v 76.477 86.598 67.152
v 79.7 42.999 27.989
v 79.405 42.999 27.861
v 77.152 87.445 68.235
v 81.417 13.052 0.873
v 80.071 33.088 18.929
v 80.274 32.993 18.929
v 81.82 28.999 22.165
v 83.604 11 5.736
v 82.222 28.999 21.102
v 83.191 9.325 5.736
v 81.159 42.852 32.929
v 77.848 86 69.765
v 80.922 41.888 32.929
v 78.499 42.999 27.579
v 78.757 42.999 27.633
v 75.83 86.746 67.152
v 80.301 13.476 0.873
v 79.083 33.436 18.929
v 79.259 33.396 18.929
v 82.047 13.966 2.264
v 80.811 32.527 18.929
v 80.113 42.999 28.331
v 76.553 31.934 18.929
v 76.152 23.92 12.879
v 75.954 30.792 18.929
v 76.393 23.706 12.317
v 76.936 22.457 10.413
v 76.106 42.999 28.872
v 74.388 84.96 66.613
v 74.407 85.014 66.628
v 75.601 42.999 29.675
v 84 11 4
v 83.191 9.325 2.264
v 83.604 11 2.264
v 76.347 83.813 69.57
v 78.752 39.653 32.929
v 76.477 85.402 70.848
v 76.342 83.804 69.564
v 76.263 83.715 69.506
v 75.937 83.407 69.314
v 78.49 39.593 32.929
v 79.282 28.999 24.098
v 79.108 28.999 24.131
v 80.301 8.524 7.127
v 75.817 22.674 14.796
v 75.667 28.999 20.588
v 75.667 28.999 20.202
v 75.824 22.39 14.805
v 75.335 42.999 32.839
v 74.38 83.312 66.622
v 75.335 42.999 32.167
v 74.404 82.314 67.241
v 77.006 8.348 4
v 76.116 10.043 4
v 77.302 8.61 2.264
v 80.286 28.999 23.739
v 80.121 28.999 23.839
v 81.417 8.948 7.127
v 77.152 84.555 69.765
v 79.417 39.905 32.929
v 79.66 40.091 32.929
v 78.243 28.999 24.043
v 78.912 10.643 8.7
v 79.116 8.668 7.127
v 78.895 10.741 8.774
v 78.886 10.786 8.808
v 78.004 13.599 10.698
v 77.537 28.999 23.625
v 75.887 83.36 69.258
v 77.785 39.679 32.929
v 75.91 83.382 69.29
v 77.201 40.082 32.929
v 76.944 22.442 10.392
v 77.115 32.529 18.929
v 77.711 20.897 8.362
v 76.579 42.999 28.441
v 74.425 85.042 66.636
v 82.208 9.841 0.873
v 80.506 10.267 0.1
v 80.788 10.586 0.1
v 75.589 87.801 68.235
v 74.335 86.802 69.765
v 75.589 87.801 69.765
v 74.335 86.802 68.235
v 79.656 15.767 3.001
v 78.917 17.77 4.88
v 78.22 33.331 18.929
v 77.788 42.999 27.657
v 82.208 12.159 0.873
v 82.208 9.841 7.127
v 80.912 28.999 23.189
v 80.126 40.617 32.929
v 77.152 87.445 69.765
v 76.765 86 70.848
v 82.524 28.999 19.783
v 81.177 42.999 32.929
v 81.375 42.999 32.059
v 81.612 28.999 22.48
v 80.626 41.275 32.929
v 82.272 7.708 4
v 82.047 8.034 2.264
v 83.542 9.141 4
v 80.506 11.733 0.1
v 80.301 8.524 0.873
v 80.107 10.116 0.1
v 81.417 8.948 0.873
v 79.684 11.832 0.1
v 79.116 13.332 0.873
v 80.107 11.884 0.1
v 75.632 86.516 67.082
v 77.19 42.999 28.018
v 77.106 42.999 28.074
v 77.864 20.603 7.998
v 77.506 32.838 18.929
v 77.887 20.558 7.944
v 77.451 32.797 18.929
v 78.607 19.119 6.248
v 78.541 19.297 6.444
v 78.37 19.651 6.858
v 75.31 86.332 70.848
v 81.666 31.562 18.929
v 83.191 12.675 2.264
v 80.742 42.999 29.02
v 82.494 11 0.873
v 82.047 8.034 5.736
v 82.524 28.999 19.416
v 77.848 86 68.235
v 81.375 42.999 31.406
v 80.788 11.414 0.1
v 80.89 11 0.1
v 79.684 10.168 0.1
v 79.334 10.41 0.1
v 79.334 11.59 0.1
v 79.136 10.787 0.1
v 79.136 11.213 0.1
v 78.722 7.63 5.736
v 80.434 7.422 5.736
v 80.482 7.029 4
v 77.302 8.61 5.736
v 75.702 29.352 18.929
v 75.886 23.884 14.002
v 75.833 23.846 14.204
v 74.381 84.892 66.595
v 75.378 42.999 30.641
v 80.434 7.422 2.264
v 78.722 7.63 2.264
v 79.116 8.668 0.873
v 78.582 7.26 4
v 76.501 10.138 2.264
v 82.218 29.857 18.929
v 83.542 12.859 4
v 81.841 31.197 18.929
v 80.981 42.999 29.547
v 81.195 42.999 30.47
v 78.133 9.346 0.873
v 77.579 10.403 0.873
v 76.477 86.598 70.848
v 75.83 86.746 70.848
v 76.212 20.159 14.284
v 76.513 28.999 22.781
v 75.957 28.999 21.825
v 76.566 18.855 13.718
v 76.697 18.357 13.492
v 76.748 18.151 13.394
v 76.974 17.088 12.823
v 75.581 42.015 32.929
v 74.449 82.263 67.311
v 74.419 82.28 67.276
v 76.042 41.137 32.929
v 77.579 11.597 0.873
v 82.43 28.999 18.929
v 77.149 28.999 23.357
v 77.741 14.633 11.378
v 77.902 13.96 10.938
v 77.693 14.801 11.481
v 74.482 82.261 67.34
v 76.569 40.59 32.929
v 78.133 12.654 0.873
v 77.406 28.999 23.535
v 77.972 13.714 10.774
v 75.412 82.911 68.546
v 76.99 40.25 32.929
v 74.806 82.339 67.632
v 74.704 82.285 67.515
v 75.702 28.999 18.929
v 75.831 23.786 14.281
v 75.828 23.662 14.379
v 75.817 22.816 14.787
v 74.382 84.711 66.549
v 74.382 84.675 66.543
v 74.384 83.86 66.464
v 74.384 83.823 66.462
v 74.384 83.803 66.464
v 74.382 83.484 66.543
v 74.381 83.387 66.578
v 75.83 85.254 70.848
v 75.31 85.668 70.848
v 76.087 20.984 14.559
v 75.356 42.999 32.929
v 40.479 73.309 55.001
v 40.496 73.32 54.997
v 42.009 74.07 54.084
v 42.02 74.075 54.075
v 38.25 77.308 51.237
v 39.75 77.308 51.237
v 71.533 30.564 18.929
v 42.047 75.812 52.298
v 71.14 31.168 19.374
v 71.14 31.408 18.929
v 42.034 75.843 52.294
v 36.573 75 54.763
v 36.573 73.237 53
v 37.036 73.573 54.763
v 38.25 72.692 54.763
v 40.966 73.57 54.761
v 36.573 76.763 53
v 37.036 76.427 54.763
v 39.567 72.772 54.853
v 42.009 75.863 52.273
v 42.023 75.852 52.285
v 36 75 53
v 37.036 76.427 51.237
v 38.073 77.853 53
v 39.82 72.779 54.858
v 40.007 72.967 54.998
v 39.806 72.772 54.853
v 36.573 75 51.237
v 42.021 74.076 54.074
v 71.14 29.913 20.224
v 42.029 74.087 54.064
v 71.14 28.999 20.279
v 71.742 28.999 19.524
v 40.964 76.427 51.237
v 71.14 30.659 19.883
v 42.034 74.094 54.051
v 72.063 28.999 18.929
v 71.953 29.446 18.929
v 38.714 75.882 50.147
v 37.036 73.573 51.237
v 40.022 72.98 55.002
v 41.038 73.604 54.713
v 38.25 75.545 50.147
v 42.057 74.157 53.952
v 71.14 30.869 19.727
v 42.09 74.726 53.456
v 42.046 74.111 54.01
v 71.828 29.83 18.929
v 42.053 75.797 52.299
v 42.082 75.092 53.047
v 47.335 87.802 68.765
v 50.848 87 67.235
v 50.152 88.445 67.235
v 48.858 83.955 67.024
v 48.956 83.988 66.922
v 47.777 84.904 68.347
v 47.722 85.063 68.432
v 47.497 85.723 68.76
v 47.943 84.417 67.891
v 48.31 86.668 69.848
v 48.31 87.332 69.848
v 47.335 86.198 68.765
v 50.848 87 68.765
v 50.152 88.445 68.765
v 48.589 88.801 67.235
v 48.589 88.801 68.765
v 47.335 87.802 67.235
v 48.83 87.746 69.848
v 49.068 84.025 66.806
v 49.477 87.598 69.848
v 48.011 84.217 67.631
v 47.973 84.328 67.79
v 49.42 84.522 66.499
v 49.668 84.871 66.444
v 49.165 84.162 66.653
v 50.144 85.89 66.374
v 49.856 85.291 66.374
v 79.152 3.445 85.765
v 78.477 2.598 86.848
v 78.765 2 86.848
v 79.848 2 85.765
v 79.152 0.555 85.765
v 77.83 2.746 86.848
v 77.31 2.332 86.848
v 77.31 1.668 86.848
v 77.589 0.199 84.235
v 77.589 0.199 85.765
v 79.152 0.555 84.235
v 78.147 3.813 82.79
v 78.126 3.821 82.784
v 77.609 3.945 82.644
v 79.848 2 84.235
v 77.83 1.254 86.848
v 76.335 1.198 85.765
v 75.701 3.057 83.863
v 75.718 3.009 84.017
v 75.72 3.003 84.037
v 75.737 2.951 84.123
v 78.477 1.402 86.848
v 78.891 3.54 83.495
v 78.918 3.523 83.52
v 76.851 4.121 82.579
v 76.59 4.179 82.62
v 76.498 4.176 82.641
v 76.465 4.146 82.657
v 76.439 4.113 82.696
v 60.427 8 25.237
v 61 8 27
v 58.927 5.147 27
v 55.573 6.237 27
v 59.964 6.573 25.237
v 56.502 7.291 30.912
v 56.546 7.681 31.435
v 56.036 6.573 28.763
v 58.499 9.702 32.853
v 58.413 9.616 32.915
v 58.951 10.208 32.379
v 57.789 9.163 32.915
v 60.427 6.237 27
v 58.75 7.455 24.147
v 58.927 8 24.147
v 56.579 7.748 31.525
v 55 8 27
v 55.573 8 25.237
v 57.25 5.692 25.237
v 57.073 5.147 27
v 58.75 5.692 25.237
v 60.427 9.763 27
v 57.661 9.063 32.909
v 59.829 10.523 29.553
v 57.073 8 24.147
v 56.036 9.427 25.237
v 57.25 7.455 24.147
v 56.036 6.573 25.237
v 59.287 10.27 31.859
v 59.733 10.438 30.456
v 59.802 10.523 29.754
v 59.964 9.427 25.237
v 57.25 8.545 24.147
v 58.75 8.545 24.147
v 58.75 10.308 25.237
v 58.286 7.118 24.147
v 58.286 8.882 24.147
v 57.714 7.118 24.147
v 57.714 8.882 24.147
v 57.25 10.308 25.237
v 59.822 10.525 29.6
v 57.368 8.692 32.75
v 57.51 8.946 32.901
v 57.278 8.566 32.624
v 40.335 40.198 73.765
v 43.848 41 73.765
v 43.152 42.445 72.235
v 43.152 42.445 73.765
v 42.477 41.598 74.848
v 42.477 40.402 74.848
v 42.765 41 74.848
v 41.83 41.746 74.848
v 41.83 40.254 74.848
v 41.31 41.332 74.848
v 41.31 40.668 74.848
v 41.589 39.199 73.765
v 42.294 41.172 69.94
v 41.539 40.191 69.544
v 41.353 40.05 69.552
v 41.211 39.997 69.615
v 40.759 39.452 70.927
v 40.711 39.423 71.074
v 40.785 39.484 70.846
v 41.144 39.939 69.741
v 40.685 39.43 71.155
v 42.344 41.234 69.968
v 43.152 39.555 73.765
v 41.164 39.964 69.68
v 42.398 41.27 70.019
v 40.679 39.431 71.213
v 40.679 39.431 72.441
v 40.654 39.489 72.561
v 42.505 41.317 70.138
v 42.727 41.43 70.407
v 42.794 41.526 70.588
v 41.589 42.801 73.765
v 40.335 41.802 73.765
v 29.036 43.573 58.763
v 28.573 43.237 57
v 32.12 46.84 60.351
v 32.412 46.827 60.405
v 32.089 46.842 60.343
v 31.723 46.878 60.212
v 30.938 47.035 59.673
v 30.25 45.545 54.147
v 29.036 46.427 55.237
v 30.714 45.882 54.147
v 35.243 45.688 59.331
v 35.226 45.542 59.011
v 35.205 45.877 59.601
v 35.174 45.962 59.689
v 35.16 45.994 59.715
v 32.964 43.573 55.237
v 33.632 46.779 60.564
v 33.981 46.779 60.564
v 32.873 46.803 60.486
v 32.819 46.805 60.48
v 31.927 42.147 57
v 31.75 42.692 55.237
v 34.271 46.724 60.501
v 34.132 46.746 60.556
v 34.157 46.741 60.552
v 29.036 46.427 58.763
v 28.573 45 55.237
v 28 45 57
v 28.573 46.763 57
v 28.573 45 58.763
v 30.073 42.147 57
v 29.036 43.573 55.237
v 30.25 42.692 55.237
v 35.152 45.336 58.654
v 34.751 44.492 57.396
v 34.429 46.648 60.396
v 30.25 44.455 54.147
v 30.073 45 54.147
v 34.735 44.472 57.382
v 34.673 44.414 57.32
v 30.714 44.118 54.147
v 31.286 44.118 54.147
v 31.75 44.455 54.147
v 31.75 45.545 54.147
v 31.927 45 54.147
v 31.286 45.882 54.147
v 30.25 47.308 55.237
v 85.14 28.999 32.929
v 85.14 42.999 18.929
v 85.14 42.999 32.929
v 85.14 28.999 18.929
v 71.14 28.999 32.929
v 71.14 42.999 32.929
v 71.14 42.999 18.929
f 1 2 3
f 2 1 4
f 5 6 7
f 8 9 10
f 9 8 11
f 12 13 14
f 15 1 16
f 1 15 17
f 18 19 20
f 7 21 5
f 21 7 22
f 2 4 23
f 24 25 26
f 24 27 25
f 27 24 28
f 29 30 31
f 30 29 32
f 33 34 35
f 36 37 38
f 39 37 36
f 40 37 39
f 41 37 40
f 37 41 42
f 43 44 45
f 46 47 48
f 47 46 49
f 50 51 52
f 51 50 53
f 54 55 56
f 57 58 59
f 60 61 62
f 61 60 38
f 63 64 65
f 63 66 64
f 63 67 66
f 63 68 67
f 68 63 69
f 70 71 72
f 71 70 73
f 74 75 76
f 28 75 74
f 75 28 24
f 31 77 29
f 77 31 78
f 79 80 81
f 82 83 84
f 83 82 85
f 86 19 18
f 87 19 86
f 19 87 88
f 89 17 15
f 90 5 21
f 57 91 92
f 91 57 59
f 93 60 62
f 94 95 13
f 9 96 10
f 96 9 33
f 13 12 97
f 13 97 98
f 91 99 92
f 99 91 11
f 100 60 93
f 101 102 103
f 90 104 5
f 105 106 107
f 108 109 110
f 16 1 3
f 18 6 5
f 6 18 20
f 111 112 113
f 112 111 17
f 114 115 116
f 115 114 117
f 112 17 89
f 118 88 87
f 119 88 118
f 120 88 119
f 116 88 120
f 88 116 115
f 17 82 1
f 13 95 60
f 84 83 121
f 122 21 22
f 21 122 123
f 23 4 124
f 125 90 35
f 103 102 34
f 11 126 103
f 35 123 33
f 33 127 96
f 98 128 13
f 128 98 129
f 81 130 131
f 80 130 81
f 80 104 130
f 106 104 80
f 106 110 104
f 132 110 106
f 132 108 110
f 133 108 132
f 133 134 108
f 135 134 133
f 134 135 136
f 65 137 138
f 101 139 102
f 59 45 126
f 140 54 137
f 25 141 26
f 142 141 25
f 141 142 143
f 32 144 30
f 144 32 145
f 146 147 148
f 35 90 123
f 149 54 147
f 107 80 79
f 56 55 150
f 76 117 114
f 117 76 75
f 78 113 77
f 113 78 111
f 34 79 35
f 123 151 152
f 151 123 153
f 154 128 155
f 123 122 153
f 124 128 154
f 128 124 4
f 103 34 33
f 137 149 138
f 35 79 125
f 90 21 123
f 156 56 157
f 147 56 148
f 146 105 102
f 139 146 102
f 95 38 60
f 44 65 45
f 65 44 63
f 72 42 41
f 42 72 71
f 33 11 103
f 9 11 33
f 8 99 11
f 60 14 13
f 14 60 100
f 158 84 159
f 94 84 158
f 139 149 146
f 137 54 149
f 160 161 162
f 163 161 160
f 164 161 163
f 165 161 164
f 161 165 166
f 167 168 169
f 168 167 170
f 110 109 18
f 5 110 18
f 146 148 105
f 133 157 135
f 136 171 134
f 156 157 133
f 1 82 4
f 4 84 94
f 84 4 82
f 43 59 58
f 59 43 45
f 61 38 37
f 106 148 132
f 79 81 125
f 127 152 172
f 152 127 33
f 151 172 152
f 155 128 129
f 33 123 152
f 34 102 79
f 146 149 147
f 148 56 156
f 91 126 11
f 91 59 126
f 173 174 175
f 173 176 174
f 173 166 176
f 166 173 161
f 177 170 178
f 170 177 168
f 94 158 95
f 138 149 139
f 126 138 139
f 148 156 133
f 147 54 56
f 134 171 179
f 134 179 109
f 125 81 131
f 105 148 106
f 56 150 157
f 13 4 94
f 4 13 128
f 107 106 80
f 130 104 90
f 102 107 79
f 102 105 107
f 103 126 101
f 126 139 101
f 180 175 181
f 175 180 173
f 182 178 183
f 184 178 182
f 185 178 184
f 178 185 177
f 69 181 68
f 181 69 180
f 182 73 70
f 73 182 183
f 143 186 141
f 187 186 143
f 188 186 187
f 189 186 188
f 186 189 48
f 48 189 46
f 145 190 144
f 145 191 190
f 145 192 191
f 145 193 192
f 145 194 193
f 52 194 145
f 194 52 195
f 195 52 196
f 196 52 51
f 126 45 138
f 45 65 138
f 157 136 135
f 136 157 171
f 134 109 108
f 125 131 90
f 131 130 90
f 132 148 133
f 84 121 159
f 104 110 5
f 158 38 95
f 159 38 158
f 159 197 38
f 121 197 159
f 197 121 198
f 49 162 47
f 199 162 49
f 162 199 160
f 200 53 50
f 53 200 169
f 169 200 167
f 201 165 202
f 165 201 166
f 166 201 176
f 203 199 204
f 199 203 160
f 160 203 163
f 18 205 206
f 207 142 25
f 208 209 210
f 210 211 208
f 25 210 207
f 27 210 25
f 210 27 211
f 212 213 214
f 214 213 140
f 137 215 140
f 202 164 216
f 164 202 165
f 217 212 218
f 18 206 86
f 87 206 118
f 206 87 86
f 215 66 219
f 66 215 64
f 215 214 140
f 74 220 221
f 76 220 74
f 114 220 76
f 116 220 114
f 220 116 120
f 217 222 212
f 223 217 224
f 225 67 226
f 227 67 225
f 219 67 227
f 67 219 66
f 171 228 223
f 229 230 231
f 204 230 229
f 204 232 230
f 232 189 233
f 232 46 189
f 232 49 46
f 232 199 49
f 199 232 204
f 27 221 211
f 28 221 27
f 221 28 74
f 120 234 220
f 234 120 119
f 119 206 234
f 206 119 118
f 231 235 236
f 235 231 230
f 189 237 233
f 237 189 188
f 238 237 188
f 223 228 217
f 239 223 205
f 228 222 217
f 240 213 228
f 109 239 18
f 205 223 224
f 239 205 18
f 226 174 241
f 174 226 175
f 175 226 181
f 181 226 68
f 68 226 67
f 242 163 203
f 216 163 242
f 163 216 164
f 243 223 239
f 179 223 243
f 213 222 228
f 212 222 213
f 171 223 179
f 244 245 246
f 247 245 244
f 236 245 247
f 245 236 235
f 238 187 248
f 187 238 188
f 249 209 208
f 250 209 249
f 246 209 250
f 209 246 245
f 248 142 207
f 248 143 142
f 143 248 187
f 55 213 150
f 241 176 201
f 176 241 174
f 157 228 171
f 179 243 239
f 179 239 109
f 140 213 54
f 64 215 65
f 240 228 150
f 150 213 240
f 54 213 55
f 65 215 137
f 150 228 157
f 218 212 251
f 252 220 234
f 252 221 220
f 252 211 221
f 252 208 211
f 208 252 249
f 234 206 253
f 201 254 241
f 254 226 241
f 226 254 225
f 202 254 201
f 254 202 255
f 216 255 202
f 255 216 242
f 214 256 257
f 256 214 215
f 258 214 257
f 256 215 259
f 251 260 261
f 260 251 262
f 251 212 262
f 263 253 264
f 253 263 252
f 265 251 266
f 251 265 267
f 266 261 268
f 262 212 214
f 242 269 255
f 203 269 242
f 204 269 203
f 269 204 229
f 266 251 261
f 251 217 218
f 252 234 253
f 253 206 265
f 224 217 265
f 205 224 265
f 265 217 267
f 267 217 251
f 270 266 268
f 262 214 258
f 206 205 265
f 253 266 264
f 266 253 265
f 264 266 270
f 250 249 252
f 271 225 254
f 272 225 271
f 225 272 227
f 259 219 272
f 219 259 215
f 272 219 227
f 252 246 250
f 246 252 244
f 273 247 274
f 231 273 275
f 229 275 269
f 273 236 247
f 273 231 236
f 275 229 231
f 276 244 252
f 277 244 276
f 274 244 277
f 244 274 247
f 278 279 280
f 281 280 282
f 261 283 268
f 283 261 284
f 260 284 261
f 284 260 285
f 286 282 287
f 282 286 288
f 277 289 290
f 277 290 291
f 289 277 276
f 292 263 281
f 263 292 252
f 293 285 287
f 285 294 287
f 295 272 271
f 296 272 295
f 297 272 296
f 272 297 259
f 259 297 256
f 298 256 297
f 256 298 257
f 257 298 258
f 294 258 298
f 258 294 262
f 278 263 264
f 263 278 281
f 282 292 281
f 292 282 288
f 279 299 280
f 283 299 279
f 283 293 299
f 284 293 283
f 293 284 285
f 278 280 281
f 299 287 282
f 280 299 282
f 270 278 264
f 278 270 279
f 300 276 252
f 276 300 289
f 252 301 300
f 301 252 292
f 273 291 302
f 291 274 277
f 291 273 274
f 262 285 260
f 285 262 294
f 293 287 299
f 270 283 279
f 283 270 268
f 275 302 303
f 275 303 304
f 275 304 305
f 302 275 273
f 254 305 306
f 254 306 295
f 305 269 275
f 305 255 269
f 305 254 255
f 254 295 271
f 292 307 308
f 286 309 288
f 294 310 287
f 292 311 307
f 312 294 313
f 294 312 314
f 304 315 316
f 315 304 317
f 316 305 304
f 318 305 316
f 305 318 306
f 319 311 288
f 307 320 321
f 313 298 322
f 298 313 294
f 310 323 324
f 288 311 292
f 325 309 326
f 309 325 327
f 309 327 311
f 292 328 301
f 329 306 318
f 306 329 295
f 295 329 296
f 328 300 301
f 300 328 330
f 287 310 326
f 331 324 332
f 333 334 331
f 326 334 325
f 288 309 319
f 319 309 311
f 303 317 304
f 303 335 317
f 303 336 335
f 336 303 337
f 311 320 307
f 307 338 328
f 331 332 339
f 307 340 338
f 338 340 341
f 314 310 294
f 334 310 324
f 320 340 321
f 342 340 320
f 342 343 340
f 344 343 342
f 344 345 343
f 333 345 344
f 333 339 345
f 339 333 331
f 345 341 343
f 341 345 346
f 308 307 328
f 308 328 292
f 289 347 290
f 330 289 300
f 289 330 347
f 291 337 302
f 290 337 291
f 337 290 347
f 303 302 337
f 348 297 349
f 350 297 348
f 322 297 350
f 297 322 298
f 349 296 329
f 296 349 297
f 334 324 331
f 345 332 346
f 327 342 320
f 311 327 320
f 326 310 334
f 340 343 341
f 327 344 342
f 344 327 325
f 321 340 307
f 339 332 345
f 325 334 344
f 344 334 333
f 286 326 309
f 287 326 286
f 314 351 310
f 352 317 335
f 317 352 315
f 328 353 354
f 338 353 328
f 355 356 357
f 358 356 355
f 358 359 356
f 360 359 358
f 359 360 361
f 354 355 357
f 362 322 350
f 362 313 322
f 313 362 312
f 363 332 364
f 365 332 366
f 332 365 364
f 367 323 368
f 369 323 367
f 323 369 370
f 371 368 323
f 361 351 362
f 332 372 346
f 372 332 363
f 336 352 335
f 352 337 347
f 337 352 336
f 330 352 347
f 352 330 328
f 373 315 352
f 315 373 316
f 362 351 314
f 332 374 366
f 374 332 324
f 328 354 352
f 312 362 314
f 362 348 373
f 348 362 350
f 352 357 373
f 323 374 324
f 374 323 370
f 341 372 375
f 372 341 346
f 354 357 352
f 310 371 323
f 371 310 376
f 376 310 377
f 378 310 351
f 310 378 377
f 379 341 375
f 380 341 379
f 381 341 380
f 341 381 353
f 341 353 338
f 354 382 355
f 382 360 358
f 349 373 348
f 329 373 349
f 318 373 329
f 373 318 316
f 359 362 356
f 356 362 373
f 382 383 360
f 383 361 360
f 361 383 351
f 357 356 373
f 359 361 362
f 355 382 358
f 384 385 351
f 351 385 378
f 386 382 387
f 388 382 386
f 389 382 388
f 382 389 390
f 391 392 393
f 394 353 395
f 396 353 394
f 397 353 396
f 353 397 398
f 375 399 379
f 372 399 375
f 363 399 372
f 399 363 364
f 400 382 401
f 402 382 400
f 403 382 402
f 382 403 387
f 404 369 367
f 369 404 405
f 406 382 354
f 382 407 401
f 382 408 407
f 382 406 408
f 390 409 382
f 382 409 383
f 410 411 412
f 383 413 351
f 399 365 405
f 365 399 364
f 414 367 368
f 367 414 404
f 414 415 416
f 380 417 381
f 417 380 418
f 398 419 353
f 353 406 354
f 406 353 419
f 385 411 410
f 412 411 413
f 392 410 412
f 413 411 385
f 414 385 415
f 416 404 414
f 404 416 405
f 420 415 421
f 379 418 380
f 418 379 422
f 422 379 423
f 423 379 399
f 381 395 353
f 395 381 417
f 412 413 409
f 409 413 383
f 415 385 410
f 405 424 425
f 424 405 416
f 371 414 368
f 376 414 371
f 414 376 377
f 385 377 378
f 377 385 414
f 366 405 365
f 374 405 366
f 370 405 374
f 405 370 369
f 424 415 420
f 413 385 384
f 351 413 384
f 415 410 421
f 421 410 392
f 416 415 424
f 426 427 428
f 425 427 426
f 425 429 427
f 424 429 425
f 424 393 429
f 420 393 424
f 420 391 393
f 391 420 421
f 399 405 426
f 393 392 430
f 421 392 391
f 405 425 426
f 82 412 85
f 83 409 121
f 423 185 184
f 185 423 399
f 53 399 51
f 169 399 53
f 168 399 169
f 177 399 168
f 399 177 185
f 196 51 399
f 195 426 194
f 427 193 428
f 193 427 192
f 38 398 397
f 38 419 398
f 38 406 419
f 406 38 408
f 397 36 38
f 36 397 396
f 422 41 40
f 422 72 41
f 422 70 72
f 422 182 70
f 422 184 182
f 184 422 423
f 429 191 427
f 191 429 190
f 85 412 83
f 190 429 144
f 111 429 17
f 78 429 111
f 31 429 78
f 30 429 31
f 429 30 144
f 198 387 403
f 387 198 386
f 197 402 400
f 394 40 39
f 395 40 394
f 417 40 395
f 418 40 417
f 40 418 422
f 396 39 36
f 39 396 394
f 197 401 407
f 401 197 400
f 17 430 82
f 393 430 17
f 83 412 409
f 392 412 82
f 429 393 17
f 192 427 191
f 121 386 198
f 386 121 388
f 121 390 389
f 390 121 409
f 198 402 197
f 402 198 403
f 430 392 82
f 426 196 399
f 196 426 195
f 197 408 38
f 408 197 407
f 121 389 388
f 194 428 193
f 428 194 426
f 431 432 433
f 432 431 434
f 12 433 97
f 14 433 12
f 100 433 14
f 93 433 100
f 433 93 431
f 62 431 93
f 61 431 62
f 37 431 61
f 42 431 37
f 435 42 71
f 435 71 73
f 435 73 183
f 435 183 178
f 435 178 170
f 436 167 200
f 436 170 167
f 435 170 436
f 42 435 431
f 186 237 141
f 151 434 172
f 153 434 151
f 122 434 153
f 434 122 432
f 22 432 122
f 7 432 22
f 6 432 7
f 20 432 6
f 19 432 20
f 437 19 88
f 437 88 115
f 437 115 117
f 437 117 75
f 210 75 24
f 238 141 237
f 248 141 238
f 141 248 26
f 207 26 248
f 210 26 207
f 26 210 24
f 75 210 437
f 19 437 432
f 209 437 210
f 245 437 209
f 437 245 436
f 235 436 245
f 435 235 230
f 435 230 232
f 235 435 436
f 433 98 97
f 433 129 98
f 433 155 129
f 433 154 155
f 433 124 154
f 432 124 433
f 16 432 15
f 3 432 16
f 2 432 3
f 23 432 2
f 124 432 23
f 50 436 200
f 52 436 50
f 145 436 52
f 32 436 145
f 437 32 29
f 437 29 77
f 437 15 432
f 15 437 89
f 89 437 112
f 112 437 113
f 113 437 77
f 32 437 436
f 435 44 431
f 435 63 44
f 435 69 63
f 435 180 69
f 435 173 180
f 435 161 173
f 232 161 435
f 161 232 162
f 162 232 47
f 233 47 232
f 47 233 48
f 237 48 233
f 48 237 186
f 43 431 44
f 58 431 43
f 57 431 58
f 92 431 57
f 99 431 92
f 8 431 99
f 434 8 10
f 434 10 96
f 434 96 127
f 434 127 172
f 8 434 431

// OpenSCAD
//v1=[for([0:15])[rnd(100),rnd(100),rnd(100)] ];
v1= [[76, 86, 69, 2, [0, 0, 0]], [80, 11, 4, 4, [0, 0, 0]], [39, 75, 53, 3, [0, 0, 0]], [49, 87, 68, 2, [0, 0, 0]], [78, 2, 85, 2, [0, 0, 0]], [58, 8, 27, 3, [0, 0, 0]], [42, 41, 73, 2, [0, 0, 0]], [31, 45, 57, 3, [0, 0, 0]] ];
 path1=[for(t=[0:1/100:1]) (smooth_animate(t, v1) )];
color("Red")  polyline(v1) ;
  echo(roundlist(v1,1));
n=smooth_animate($t, v1);
//n=elastic_animate($t, v1);




p=v3(n-[0,0,0,0]);
z=n[3];
c=n[4];
 translate(p)color("Red")scale(1)cube(14,center=true);
 
 function easeOutElastic(  ti,   b=0,   c=1,   d=2) = let(
      t=ti/d,
      ts = t * t,
      tc = ts*t
)
     b+c*(
 33*tc*ts 
 + -106*ts*ts 
 + 126*tc 
 + -67*ts 
 + 15*t
);
 
  function elasticOut(t )=
 1- (1-pow(t,0.6))* (cos( pow((t*4+1),2.65)*360*0.01*1.1) )   ;
 
function wrapi(x,tak) =  ((x  % tak) + tak) % tak; // wraps index 0 - x 
 
function lerp( v1, v2, bias) = (1-bias)*v1 + bias*v2;

function smooth_animate(t,v)=let(
ll=len(v),        i=round(ll*t),       T=easeOutElastic((ll*t+0.5)%1) , 
p0=    lerp(v[ wrapi(i-1,ll)], v[wrapi(i,ll)],0.5),
p1=    v[wrapi(i,len(v))], 
p2=    lerp( v[wrapi(i,ll)],v[ wrapi(i+1,ll)],0.5) ) 
lerp(lerp( p0,p1,T),lerp(p1,p2,T),(T)) ;

function elastic_animate(t,v)=let(
ll=len(v),        i=round(ll*t),       T=((ll*t+0.5  )%1) , 
p0=     v[ wrapi(i-1,ll)] ,
 p2=     v[ wrapi(i,ll)]  ) 
 lerp( p0, p2,easeOutElastic(T )) ;

function v3(v) = [v[0], max(0,v[1]), max(0,v[2])];





 module polyline(p) {for(i=[0:max(0,len(p)-1)])line(p[i],p[ wrap(i+1,len(p))]);
} // polyline plotter
module line(p1, p2 ,width=0.1) 
{ // single line plotter
 color(p1[4])   hull() {
        translate(v3(p1)) sphere(p1[3]);
        translate(v3(p2)) sphere(p2[3]);
    }
}
function wrap(x,x_max=1,x_min=0) =

 (((x - x_min) % (x_max - x_min)) + (x_max - x_min)) % (x_max - x_min) + x_min; // wraps numbers 

 

function v3(v) = [v[0], max(0,v[1]), max(0,v[2])];

function rnd(a = 1, b = 0, s = []) = 
  s == [] ? 
   (rands(min(a, b), max(   a, b), 1)[0]) 
  : 
   (rands(min(a, b), max(a, b), 1, s)[0])
  ; 
function roundlist(v,r = 0.01) = len(v) == undef ? v - (v % r) : len(v) == 0 ? [] : [
  for (i = [0: len(v) - 1]) roundlist(v[i],r)];
